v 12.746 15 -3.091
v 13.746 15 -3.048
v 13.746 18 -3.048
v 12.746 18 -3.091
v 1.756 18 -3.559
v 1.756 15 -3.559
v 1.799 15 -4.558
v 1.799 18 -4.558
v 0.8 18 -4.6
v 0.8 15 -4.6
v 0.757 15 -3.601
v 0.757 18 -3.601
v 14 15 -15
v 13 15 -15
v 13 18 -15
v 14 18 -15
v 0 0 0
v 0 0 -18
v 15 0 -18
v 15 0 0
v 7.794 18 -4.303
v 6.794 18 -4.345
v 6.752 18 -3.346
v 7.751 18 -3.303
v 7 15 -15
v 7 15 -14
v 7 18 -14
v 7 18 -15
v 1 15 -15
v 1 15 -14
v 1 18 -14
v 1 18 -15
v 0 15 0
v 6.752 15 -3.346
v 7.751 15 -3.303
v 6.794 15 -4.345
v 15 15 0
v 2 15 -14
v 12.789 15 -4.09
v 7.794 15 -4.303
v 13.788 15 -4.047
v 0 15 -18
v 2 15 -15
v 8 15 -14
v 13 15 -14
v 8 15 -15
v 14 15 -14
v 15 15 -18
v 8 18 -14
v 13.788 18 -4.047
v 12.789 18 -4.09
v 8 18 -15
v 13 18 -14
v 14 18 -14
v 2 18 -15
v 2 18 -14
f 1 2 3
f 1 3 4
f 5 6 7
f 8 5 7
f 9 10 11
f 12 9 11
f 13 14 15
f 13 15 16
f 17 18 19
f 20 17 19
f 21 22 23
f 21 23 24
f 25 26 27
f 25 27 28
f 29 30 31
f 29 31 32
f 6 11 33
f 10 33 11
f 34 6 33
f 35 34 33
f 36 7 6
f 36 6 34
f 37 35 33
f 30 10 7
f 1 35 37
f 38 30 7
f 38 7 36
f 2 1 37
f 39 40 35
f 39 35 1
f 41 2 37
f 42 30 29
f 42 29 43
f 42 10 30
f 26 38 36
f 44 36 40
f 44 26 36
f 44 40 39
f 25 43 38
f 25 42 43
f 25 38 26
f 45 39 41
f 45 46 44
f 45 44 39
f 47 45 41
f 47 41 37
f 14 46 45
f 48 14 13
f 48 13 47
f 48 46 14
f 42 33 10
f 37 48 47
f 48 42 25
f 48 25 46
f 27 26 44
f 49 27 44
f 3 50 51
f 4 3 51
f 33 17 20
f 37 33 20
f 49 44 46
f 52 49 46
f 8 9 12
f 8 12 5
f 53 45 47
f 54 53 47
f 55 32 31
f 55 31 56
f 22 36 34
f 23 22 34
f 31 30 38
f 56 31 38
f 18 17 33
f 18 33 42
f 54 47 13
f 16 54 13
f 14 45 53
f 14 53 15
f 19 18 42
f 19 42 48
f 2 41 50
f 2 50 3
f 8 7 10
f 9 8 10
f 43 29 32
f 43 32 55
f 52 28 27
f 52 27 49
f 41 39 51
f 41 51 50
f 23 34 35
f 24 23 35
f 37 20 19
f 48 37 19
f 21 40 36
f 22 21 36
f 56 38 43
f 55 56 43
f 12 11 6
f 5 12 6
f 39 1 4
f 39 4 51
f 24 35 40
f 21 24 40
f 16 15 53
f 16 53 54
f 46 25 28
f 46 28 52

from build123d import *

# Parameters (mm, degrees)
ESQUISSE1_W        = 15
ESQUISSE1_H        = 18
BOSS_EXTRU_1_DEPTH = 15
ESQUISSE2_W        = 1
ESQUISSE2_H        = 1
BOSS_EXTRU_2_DEPTH = 3


with BuildPart() as part:
    # Esquisse1 → Boss.-Extru.1 (new body)
    with BuildSketch(Plane(origin=(0, 0, 0), x_dir=(1, 0, 0), z_dir=(0, 1, 0))):
        with Locations((7.5, 9)):
            Rectangle(ESQUISSE1_W, ESQUISSE1_H)
    extrude(amount=BOSS_EXTRU_1_DEPTH)

    # Esquisse2 → Boss.-Extru.2 (add)
    with BuildSketch(Plane(origin=(0, 15, 0), x_dir=(1, 0, 0), z_dir=(0, 1, 0))):
        with Locations((1.5, 14.5)):
            Rectangle(ESQUISSE2_W, ESQUISSE2_H)
        with Locations((7.5, 14.5)):
            Rectangle(ESQUISSE2_W, ESQUISSE2_H)
        with Locations((13.5, 14.5)):
            Rectangle(ESQUISSE2_W, ESQUISSE2_H)
        Polygon((12.746406665, 3.090573879), (12.788974359, 4.089667464), (13.788067944, 4.04709977), (13.745500249, 3.048006185), align=None)
        Polygon((7.75093874, 3.30341235), (7.793506434, 4.302505935), (6.794412849, 4.34507363), (6.751845155, 3.345980045), align=None)
        Polygon((1.756377231, 3.558818516), (1.798944925, 4.557912101), (0.79985134, 4.600479795), (0.757283646, 3.60138621), align=None)
    extrude(amount=BOSS_EXTRU_2_DEPTH)


solid = part.part
